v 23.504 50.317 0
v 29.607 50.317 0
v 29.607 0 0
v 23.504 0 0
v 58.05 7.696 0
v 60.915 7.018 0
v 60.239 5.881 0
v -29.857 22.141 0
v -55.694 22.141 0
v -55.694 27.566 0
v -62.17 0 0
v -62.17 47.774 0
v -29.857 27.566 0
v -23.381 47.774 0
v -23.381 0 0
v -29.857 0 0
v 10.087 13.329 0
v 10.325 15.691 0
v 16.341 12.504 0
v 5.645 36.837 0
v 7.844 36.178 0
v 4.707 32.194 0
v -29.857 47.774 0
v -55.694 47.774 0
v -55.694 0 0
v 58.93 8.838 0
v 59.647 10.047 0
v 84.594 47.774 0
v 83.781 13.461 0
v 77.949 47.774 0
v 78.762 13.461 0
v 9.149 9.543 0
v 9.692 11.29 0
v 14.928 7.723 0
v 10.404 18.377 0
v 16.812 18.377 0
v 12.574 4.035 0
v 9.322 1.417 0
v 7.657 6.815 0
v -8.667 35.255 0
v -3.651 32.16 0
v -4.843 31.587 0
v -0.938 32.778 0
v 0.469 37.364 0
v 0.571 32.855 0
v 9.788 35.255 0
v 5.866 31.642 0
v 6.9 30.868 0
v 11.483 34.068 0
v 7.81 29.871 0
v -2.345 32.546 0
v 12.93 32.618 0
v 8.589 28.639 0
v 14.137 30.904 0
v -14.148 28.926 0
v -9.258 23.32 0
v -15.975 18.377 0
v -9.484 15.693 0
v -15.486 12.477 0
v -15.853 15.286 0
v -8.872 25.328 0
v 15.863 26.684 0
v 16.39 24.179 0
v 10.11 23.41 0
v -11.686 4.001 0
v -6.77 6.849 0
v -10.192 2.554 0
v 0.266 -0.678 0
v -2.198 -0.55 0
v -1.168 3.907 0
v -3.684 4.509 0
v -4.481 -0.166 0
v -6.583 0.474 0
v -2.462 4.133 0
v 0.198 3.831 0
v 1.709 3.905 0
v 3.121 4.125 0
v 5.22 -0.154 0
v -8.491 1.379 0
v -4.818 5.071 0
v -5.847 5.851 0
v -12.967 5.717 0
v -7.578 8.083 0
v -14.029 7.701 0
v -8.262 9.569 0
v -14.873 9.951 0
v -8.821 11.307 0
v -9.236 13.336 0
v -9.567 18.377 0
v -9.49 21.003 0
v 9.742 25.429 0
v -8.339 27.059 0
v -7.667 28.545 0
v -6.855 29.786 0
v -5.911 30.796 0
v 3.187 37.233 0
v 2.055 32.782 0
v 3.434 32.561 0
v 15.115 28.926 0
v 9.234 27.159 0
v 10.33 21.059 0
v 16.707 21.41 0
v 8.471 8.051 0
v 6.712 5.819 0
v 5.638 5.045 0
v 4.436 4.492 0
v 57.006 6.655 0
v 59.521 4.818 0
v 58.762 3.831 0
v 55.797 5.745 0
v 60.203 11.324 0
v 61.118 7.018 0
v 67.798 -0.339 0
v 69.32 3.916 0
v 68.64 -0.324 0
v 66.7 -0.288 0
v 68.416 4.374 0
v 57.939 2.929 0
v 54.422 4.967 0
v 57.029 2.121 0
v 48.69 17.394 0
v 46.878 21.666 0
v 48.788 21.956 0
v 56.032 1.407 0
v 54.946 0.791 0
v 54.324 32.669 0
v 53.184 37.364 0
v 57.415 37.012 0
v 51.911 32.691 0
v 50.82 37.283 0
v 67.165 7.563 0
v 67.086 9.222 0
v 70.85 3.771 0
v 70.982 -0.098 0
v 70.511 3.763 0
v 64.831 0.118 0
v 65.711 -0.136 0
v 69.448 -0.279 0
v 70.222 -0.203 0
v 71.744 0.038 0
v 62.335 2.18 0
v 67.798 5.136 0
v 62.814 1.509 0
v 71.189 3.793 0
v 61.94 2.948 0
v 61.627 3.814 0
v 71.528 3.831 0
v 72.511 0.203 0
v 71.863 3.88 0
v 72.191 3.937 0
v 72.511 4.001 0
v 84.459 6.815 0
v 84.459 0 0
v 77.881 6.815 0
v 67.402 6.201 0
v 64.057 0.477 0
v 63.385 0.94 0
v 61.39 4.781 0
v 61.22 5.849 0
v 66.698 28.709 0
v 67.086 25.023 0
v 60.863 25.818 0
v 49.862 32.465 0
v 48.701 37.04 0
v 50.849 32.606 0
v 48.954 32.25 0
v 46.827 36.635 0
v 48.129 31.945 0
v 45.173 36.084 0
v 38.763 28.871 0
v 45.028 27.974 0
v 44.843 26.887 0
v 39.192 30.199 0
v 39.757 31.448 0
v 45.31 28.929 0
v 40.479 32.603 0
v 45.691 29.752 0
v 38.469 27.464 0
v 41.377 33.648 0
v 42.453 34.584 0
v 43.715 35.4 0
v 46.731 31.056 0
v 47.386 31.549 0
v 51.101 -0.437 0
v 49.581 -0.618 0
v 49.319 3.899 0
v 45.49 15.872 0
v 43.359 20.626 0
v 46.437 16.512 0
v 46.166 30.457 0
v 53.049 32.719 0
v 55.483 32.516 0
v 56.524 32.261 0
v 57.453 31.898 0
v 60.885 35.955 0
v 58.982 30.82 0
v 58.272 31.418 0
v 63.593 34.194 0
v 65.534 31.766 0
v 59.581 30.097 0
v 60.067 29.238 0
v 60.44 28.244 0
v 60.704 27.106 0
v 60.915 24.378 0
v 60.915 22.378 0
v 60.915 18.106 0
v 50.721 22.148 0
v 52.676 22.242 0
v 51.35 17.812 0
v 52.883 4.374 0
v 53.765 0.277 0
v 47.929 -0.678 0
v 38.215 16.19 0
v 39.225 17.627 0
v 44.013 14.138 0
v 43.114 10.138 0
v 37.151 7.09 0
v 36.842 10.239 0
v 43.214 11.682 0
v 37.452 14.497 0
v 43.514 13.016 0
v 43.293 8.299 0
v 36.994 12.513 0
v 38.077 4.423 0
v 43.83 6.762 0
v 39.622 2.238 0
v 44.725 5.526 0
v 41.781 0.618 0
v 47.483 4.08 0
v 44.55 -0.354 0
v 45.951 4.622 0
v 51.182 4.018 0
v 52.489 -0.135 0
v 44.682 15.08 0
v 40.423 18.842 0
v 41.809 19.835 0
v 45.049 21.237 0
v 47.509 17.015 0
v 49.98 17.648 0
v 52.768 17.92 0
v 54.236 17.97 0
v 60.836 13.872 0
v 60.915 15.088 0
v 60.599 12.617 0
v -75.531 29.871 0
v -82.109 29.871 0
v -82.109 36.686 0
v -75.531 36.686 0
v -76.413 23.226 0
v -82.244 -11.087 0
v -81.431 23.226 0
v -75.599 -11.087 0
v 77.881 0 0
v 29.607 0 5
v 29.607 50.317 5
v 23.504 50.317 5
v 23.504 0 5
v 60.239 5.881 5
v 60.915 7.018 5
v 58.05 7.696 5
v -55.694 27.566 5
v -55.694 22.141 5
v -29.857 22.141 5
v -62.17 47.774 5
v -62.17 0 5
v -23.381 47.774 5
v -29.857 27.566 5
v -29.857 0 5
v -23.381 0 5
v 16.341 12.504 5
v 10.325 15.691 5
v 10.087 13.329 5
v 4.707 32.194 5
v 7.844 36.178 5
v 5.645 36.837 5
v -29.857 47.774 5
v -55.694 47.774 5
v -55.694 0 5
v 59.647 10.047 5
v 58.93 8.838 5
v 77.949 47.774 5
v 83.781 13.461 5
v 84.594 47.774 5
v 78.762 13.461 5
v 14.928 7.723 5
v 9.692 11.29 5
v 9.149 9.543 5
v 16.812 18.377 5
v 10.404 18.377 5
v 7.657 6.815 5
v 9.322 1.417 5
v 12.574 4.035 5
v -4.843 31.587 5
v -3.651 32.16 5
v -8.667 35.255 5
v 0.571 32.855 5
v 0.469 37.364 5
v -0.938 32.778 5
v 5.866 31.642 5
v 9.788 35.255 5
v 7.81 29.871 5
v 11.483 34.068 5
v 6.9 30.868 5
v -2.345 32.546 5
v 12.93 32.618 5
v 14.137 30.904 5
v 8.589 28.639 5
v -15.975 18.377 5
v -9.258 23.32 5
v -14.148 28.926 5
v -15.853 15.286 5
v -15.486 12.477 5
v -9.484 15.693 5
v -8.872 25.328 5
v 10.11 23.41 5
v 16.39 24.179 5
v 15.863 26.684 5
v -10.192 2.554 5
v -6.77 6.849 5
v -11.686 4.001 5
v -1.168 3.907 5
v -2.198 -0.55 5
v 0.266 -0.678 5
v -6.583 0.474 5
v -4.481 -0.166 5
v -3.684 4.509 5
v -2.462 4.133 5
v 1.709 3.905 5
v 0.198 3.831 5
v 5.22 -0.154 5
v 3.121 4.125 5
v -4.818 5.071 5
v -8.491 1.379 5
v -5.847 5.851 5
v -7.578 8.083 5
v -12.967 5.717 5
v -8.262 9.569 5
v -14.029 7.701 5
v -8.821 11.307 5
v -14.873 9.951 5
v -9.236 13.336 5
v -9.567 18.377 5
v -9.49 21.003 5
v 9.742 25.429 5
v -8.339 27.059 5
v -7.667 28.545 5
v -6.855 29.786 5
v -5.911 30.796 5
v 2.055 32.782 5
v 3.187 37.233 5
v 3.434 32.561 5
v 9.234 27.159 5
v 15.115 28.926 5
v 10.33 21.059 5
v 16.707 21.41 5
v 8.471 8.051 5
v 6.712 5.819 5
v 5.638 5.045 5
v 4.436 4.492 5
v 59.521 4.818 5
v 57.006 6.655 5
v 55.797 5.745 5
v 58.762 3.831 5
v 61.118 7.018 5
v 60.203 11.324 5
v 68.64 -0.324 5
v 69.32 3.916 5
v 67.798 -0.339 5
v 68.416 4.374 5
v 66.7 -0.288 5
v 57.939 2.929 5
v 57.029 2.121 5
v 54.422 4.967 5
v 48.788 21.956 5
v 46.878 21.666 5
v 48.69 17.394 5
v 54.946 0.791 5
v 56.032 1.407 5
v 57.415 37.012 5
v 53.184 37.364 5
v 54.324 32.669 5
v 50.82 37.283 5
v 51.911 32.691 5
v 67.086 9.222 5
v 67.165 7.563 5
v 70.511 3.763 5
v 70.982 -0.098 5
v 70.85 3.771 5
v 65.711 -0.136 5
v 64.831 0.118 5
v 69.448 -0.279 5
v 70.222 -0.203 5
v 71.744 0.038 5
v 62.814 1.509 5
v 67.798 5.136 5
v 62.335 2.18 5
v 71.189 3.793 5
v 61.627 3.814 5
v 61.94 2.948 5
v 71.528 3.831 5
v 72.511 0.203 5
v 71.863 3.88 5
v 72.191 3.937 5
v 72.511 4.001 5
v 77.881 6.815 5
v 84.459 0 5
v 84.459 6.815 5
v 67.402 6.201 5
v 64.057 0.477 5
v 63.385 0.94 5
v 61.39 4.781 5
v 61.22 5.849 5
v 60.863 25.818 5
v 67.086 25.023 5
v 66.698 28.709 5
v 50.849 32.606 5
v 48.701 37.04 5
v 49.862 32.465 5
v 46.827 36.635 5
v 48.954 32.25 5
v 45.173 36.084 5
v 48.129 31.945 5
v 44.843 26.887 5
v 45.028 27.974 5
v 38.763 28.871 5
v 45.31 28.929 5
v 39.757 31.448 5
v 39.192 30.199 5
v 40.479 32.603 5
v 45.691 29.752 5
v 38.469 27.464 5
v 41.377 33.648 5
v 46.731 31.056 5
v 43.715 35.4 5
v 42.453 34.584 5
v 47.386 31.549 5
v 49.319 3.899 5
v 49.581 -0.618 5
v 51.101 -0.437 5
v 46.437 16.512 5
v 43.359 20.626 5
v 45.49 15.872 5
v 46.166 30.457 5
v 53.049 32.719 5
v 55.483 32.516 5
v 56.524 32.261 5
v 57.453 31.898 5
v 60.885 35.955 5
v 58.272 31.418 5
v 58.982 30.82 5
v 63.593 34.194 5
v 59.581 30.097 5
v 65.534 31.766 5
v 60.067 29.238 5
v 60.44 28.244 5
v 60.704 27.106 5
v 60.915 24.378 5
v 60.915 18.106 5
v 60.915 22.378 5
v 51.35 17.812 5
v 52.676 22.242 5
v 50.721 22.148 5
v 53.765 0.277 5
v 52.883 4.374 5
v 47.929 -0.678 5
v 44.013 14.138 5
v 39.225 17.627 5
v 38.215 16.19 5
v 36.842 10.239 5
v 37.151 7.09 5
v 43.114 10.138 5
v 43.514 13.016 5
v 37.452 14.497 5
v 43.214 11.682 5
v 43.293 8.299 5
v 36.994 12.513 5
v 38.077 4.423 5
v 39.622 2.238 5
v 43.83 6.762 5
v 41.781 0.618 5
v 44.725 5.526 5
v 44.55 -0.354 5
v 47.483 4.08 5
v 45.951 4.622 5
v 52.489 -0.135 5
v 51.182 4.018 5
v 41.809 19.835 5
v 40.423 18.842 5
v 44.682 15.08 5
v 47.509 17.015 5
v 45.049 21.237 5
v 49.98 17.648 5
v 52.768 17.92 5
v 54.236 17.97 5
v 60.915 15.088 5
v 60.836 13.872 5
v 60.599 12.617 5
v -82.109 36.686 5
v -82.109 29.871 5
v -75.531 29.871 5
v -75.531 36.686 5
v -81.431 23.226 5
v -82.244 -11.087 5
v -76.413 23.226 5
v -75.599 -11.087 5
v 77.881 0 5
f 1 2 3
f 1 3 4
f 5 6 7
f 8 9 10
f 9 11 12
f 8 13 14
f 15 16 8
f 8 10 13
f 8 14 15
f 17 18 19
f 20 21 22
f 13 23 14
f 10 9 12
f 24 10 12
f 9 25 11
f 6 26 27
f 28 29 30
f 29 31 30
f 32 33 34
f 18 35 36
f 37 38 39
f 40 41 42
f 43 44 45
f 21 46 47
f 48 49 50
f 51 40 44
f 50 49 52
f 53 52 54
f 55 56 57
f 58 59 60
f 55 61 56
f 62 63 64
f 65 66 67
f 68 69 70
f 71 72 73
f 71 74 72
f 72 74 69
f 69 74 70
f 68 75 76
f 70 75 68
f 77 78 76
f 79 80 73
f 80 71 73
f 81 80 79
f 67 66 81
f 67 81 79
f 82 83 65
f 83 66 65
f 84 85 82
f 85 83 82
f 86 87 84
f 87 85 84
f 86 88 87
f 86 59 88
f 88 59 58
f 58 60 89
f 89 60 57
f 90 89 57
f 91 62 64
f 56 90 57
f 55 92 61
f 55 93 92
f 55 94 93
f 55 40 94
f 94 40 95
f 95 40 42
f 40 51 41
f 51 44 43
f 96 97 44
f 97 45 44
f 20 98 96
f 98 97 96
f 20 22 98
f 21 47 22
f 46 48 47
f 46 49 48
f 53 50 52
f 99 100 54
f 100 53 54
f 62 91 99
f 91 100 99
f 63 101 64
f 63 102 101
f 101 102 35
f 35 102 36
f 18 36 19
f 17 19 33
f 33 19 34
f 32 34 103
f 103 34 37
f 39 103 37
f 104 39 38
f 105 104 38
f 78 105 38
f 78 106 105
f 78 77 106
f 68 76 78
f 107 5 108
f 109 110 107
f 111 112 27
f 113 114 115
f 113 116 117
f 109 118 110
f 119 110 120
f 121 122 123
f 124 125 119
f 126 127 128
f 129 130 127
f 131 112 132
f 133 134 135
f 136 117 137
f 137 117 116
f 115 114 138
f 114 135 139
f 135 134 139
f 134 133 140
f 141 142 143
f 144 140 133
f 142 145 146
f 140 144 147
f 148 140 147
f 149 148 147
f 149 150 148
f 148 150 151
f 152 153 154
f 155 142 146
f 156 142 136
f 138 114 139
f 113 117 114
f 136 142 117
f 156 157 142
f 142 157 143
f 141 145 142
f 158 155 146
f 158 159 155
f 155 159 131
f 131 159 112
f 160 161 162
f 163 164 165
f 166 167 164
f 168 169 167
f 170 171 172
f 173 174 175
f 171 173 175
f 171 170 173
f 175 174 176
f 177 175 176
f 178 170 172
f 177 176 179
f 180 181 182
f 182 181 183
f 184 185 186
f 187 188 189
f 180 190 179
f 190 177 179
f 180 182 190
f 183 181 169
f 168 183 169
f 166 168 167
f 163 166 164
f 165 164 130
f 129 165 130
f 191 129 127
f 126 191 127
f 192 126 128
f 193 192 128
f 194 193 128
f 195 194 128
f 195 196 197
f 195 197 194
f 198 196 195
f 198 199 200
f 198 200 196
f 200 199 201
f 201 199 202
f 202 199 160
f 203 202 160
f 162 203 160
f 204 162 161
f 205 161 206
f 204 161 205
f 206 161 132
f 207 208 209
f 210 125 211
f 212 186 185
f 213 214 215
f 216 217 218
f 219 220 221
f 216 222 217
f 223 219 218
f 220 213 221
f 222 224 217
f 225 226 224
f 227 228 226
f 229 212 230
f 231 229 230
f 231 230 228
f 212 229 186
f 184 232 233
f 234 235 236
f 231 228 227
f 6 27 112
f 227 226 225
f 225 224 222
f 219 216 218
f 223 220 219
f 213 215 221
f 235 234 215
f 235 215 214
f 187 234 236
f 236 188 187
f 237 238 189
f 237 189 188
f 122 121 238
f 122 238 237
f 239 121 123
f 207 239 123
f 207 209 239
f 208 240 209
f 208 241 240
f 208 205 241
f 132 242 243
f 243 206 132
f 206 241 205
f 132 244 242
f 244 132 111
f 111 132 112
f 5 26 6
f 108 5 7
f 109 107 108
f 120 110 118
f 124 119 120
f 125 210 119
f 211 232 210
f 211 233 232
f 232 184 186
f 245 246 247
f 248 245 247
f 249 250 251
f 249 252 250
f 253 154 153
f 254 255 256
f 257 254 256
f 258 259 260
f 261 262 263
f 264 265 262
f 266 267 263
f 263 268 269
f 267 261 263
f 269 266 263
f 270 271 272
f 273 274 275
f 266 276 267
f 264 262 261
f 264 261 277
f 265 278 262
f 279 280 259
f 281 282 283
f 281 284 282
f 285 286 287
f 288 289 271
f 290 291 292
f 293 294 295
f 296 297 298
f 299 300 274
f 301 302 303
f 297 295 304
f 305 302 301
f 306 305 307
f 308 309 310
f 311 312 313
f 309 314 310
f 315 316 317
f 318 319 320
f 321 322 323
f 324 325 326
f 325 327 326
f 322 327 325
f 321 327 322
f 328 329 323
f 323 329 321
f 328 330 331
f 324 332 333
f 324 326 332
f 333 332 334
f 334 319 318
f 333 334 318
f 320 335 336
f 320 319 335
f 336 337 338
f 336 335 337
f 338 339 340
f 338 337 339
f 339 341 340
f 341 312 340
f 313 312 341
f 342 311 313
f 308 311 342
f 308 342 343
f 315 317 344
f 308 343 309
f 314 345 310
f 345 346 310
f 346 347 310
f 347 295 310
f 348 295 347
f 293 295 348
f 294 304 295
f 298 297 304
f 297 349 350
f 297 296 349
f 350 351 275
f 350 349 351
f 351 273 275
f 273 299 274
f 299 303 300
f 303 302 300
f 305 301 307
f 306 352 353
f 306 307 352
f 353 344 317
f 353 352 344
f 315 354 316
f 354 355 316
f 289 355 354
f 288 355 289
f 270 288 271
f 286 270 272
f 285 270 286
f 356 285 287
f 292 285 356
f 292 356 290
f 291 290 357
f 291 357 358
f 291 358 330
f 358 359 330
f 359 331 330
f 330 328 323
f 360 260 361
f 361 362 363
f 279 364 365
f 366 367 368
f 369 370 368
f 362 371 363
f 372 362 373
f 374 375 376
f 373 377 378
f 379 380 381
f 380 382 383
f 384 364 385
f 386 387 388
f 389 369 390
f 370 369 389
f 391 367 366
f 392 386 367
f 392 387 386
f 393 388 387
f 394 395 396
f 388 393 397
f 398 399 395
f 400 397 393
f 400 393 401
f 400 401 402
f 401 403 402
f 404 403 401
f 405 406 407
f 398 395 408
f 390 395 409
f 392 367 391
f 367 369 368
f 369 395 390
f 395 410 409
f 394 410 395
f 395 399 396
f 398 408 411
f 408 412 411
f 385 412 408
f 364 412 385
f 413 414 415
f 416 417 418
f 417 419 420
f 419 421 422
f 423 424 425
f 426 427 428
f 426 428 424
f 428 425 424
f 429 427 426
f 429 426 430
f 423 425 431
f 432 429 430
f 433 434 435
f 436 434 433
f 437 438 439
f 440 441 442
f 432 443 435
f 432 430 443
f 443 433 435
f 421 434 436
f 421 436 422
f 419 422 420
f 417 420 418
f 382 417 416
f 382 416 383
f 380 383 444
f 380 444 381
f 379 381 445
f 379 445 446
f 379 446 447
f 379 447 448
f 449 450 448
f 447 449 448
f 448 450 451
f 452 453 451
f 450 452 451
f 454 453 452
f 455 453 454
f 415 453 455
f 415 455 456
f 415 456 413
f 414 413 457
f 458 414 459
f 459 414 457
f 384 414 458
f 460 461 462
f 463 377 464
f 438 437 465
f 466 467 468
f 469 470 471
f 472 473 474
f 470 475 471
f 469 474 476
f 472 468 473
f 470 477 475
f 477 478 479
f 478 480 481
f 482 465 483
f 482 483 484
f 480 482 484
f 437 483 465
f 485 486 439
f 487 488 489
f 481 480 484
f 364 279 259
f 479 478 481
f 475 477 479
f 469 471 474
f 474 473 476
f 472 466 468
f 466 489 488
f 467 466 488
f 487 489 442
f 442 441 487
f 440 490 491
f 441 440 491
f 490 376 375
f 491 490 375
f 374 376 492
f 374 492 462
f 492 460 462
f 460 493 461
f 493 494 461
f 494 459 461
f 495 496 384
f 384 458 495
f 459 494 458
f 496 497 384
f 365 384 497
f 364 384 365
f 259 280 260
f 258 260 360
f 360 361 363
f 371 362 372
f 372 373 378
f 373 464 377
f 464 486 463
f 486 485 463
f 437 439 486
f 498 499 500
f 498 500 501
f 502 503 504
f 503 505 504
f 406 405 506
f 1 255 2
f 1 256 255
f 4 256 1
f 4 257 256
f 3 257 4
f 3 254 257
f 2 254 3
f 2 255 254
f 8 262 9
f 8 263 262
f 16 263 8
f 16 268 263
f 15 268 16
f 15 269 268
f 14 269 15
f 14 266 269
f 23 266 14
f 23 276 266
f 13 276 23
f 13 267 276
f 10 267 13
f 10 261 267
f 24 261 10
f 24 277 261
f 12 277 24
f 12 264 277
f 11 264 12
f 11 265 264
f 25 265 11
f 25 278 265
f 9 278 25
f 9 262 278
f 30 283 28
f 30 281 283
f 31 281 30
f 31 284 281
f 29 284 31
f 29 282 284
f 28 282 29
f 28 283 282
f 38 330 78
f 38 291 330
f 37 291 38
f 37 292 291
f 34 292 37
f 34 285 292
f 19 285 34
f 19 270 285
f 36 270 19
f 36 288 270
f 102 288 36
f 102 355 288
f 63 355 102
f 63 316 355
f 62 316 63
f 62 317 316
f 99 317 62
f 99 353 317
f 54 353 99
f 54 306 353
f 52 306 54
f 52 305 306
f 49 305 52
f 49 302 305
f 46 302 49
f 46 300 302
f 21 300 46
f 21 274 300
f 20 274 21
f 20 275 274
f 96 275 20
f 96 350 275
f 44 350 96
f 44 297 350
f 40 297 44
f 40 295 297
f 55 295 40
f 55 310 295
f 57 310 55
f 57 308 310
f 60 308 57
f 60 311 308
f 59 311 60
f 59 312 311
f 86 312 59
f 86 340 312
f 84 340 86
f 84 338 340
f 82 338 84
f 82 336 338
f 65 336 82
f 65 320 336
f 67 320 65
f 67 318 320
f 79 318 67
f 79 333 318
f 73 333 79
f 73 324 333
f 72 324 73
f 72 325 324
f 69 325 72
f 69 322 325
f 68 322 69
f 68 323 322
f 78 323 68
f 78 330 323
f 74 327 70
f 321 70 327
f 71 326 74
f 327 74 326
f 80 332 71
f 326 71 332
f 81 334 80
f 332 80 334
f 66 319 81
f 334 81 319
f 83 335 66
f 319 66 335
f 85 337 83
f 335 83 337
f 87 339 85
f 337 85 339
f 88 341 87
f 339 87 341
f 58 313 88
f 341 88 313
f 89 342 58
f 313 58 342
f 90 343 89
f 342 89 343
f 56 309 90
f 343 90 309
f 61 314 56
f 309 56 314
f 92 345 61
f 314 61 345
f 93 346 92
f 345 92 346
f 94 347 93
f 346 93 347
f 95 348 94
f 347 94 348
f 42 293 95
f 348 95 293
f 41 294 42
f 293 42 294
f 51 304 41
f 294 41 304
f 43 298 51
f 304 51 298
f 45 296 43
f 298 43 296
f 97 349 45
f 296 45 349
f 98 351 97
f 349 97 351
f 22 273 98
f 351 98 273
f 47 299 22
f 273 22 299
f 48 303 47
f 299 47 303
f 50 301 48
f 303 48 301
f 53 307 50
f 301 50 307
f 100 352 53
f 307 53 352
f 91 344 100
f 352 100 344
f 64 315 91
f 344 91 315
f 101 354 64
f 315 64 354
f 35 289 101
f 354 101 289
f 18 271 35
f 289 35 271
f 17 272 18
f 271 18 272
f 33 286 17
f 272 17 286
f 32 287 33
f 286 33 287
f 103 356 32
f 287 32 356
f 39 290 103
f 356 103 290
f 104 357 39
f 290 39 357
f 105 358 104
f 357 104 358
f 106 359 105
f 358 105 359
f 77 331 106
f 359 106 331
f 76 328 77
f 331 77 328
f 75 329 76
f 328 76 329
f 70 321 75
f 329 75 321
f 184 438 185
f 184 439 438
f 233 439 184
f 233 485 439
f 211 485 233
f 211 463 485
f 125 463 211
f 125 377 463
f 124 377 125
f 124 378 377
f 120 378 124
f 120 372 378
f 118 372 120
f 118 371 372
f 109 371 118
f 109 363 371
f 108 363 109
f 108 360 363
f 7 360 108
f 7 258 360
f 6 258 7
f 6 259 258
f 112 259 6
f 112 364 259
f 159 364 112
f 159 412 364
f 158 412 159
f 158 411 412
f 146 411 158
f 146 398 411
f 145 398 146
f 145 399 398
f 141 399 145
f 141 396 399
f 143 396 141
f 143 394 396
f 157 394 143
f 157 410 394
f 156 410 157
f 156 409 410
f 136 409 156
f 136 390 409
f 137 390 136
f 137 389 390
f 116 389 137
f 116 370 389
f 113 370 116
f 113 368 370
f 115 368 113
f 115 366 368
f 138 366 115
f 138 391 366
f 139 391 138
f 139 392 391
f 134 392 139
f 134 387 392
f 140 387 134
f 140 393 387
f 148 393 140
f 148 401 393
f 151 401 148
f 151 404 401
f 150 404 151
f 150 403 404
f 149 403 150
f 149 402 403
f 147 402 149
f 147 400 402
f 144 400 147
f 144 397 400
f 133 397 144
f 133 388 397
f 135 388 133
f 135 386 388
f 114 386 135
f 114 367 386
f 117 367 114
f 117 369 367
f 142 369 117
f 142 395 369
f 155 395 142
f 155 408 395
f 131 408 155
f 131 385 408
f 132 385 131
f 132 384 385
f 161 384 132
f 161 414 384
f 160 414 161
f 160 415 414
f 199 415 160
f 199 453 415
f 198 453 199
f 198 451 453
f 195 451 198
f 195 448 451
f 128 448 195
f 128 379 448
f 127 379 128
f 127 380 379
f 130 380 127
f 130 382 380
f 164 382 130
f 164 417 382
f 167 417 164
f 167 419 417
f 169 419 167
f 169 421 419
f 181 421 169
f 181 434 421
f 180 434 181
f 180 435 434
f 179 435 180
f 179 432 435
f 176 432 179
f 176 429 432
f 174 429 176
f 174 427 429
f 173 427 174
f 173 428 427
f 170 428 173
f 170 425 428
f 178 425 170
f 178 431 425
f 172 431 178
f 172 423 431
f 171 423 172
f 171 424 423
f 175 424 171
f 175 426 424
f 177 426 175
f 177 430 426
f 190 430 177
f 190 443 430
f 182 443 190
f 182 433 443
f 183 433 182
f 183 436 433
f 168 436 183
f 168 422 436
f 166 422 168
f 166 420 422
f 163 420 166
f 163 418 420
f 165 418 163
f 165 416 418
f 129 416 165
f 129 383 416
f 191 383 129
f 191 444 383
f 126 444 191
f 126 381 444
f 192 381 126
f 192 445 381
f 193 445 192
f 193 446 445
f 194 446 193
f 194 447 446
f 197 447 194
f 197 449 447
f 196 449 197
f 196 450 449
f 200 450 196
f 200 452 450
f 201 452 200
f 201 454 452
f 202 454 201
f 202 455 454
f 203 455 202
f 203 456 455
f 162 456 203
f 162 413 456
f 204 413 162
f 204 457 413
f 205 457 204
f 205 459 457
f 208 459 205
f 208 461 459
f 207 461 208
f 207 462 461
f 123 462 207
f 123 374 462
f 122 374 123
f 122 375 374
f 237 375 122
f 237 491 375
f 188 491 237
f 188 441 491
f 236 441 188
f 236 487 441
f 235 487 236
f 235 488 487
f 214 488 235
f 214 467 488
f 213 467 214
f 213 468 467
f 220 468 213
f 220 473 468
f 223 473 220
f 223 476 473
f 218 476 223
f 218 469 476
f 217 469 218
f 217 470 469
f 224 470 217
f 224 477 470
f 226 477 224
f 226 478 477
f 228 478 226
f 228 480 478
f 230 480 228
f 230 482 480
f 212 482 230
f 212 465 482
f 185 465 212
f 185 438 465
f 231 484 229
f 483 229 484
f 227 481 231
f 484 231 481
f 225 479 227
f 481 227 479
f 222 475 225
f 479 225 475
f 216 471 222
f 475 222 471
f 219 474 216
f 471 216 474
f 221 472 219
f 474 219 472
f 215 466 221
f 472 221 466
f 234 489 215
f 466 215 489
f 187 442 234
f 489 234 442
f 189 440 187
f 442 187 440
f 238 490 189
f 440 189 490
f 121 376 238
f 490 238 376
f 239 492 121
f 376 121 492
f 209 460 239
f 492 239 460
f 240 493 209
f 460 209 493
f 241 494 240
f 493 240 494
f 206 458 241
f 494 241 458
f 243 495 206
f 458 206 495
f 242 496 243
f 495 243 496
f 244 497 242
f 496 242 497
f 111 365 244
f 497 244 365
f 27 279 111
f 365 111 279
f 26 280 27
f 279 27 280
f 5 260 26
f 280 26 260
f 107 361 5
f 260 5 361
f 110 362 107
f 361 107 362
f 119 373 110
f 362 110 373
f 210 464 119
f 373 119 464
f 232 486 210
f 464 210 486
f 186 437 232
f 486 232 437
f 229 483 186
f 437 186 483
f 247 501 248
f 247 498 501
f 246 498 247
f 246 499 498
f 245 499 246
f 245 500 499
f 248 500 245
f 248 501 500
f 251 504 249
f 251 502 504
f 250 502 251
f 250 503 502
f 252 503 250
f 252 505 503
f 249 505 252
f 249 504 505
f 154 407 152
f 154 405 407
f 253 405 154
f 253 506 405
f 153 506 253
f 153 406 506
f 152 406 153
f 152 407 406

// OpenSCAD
linear_extrude(height = 5)
text("¡Hola!", size = 50, halign = "center", 
      font = "Liberation Sans", $fn = 20);
